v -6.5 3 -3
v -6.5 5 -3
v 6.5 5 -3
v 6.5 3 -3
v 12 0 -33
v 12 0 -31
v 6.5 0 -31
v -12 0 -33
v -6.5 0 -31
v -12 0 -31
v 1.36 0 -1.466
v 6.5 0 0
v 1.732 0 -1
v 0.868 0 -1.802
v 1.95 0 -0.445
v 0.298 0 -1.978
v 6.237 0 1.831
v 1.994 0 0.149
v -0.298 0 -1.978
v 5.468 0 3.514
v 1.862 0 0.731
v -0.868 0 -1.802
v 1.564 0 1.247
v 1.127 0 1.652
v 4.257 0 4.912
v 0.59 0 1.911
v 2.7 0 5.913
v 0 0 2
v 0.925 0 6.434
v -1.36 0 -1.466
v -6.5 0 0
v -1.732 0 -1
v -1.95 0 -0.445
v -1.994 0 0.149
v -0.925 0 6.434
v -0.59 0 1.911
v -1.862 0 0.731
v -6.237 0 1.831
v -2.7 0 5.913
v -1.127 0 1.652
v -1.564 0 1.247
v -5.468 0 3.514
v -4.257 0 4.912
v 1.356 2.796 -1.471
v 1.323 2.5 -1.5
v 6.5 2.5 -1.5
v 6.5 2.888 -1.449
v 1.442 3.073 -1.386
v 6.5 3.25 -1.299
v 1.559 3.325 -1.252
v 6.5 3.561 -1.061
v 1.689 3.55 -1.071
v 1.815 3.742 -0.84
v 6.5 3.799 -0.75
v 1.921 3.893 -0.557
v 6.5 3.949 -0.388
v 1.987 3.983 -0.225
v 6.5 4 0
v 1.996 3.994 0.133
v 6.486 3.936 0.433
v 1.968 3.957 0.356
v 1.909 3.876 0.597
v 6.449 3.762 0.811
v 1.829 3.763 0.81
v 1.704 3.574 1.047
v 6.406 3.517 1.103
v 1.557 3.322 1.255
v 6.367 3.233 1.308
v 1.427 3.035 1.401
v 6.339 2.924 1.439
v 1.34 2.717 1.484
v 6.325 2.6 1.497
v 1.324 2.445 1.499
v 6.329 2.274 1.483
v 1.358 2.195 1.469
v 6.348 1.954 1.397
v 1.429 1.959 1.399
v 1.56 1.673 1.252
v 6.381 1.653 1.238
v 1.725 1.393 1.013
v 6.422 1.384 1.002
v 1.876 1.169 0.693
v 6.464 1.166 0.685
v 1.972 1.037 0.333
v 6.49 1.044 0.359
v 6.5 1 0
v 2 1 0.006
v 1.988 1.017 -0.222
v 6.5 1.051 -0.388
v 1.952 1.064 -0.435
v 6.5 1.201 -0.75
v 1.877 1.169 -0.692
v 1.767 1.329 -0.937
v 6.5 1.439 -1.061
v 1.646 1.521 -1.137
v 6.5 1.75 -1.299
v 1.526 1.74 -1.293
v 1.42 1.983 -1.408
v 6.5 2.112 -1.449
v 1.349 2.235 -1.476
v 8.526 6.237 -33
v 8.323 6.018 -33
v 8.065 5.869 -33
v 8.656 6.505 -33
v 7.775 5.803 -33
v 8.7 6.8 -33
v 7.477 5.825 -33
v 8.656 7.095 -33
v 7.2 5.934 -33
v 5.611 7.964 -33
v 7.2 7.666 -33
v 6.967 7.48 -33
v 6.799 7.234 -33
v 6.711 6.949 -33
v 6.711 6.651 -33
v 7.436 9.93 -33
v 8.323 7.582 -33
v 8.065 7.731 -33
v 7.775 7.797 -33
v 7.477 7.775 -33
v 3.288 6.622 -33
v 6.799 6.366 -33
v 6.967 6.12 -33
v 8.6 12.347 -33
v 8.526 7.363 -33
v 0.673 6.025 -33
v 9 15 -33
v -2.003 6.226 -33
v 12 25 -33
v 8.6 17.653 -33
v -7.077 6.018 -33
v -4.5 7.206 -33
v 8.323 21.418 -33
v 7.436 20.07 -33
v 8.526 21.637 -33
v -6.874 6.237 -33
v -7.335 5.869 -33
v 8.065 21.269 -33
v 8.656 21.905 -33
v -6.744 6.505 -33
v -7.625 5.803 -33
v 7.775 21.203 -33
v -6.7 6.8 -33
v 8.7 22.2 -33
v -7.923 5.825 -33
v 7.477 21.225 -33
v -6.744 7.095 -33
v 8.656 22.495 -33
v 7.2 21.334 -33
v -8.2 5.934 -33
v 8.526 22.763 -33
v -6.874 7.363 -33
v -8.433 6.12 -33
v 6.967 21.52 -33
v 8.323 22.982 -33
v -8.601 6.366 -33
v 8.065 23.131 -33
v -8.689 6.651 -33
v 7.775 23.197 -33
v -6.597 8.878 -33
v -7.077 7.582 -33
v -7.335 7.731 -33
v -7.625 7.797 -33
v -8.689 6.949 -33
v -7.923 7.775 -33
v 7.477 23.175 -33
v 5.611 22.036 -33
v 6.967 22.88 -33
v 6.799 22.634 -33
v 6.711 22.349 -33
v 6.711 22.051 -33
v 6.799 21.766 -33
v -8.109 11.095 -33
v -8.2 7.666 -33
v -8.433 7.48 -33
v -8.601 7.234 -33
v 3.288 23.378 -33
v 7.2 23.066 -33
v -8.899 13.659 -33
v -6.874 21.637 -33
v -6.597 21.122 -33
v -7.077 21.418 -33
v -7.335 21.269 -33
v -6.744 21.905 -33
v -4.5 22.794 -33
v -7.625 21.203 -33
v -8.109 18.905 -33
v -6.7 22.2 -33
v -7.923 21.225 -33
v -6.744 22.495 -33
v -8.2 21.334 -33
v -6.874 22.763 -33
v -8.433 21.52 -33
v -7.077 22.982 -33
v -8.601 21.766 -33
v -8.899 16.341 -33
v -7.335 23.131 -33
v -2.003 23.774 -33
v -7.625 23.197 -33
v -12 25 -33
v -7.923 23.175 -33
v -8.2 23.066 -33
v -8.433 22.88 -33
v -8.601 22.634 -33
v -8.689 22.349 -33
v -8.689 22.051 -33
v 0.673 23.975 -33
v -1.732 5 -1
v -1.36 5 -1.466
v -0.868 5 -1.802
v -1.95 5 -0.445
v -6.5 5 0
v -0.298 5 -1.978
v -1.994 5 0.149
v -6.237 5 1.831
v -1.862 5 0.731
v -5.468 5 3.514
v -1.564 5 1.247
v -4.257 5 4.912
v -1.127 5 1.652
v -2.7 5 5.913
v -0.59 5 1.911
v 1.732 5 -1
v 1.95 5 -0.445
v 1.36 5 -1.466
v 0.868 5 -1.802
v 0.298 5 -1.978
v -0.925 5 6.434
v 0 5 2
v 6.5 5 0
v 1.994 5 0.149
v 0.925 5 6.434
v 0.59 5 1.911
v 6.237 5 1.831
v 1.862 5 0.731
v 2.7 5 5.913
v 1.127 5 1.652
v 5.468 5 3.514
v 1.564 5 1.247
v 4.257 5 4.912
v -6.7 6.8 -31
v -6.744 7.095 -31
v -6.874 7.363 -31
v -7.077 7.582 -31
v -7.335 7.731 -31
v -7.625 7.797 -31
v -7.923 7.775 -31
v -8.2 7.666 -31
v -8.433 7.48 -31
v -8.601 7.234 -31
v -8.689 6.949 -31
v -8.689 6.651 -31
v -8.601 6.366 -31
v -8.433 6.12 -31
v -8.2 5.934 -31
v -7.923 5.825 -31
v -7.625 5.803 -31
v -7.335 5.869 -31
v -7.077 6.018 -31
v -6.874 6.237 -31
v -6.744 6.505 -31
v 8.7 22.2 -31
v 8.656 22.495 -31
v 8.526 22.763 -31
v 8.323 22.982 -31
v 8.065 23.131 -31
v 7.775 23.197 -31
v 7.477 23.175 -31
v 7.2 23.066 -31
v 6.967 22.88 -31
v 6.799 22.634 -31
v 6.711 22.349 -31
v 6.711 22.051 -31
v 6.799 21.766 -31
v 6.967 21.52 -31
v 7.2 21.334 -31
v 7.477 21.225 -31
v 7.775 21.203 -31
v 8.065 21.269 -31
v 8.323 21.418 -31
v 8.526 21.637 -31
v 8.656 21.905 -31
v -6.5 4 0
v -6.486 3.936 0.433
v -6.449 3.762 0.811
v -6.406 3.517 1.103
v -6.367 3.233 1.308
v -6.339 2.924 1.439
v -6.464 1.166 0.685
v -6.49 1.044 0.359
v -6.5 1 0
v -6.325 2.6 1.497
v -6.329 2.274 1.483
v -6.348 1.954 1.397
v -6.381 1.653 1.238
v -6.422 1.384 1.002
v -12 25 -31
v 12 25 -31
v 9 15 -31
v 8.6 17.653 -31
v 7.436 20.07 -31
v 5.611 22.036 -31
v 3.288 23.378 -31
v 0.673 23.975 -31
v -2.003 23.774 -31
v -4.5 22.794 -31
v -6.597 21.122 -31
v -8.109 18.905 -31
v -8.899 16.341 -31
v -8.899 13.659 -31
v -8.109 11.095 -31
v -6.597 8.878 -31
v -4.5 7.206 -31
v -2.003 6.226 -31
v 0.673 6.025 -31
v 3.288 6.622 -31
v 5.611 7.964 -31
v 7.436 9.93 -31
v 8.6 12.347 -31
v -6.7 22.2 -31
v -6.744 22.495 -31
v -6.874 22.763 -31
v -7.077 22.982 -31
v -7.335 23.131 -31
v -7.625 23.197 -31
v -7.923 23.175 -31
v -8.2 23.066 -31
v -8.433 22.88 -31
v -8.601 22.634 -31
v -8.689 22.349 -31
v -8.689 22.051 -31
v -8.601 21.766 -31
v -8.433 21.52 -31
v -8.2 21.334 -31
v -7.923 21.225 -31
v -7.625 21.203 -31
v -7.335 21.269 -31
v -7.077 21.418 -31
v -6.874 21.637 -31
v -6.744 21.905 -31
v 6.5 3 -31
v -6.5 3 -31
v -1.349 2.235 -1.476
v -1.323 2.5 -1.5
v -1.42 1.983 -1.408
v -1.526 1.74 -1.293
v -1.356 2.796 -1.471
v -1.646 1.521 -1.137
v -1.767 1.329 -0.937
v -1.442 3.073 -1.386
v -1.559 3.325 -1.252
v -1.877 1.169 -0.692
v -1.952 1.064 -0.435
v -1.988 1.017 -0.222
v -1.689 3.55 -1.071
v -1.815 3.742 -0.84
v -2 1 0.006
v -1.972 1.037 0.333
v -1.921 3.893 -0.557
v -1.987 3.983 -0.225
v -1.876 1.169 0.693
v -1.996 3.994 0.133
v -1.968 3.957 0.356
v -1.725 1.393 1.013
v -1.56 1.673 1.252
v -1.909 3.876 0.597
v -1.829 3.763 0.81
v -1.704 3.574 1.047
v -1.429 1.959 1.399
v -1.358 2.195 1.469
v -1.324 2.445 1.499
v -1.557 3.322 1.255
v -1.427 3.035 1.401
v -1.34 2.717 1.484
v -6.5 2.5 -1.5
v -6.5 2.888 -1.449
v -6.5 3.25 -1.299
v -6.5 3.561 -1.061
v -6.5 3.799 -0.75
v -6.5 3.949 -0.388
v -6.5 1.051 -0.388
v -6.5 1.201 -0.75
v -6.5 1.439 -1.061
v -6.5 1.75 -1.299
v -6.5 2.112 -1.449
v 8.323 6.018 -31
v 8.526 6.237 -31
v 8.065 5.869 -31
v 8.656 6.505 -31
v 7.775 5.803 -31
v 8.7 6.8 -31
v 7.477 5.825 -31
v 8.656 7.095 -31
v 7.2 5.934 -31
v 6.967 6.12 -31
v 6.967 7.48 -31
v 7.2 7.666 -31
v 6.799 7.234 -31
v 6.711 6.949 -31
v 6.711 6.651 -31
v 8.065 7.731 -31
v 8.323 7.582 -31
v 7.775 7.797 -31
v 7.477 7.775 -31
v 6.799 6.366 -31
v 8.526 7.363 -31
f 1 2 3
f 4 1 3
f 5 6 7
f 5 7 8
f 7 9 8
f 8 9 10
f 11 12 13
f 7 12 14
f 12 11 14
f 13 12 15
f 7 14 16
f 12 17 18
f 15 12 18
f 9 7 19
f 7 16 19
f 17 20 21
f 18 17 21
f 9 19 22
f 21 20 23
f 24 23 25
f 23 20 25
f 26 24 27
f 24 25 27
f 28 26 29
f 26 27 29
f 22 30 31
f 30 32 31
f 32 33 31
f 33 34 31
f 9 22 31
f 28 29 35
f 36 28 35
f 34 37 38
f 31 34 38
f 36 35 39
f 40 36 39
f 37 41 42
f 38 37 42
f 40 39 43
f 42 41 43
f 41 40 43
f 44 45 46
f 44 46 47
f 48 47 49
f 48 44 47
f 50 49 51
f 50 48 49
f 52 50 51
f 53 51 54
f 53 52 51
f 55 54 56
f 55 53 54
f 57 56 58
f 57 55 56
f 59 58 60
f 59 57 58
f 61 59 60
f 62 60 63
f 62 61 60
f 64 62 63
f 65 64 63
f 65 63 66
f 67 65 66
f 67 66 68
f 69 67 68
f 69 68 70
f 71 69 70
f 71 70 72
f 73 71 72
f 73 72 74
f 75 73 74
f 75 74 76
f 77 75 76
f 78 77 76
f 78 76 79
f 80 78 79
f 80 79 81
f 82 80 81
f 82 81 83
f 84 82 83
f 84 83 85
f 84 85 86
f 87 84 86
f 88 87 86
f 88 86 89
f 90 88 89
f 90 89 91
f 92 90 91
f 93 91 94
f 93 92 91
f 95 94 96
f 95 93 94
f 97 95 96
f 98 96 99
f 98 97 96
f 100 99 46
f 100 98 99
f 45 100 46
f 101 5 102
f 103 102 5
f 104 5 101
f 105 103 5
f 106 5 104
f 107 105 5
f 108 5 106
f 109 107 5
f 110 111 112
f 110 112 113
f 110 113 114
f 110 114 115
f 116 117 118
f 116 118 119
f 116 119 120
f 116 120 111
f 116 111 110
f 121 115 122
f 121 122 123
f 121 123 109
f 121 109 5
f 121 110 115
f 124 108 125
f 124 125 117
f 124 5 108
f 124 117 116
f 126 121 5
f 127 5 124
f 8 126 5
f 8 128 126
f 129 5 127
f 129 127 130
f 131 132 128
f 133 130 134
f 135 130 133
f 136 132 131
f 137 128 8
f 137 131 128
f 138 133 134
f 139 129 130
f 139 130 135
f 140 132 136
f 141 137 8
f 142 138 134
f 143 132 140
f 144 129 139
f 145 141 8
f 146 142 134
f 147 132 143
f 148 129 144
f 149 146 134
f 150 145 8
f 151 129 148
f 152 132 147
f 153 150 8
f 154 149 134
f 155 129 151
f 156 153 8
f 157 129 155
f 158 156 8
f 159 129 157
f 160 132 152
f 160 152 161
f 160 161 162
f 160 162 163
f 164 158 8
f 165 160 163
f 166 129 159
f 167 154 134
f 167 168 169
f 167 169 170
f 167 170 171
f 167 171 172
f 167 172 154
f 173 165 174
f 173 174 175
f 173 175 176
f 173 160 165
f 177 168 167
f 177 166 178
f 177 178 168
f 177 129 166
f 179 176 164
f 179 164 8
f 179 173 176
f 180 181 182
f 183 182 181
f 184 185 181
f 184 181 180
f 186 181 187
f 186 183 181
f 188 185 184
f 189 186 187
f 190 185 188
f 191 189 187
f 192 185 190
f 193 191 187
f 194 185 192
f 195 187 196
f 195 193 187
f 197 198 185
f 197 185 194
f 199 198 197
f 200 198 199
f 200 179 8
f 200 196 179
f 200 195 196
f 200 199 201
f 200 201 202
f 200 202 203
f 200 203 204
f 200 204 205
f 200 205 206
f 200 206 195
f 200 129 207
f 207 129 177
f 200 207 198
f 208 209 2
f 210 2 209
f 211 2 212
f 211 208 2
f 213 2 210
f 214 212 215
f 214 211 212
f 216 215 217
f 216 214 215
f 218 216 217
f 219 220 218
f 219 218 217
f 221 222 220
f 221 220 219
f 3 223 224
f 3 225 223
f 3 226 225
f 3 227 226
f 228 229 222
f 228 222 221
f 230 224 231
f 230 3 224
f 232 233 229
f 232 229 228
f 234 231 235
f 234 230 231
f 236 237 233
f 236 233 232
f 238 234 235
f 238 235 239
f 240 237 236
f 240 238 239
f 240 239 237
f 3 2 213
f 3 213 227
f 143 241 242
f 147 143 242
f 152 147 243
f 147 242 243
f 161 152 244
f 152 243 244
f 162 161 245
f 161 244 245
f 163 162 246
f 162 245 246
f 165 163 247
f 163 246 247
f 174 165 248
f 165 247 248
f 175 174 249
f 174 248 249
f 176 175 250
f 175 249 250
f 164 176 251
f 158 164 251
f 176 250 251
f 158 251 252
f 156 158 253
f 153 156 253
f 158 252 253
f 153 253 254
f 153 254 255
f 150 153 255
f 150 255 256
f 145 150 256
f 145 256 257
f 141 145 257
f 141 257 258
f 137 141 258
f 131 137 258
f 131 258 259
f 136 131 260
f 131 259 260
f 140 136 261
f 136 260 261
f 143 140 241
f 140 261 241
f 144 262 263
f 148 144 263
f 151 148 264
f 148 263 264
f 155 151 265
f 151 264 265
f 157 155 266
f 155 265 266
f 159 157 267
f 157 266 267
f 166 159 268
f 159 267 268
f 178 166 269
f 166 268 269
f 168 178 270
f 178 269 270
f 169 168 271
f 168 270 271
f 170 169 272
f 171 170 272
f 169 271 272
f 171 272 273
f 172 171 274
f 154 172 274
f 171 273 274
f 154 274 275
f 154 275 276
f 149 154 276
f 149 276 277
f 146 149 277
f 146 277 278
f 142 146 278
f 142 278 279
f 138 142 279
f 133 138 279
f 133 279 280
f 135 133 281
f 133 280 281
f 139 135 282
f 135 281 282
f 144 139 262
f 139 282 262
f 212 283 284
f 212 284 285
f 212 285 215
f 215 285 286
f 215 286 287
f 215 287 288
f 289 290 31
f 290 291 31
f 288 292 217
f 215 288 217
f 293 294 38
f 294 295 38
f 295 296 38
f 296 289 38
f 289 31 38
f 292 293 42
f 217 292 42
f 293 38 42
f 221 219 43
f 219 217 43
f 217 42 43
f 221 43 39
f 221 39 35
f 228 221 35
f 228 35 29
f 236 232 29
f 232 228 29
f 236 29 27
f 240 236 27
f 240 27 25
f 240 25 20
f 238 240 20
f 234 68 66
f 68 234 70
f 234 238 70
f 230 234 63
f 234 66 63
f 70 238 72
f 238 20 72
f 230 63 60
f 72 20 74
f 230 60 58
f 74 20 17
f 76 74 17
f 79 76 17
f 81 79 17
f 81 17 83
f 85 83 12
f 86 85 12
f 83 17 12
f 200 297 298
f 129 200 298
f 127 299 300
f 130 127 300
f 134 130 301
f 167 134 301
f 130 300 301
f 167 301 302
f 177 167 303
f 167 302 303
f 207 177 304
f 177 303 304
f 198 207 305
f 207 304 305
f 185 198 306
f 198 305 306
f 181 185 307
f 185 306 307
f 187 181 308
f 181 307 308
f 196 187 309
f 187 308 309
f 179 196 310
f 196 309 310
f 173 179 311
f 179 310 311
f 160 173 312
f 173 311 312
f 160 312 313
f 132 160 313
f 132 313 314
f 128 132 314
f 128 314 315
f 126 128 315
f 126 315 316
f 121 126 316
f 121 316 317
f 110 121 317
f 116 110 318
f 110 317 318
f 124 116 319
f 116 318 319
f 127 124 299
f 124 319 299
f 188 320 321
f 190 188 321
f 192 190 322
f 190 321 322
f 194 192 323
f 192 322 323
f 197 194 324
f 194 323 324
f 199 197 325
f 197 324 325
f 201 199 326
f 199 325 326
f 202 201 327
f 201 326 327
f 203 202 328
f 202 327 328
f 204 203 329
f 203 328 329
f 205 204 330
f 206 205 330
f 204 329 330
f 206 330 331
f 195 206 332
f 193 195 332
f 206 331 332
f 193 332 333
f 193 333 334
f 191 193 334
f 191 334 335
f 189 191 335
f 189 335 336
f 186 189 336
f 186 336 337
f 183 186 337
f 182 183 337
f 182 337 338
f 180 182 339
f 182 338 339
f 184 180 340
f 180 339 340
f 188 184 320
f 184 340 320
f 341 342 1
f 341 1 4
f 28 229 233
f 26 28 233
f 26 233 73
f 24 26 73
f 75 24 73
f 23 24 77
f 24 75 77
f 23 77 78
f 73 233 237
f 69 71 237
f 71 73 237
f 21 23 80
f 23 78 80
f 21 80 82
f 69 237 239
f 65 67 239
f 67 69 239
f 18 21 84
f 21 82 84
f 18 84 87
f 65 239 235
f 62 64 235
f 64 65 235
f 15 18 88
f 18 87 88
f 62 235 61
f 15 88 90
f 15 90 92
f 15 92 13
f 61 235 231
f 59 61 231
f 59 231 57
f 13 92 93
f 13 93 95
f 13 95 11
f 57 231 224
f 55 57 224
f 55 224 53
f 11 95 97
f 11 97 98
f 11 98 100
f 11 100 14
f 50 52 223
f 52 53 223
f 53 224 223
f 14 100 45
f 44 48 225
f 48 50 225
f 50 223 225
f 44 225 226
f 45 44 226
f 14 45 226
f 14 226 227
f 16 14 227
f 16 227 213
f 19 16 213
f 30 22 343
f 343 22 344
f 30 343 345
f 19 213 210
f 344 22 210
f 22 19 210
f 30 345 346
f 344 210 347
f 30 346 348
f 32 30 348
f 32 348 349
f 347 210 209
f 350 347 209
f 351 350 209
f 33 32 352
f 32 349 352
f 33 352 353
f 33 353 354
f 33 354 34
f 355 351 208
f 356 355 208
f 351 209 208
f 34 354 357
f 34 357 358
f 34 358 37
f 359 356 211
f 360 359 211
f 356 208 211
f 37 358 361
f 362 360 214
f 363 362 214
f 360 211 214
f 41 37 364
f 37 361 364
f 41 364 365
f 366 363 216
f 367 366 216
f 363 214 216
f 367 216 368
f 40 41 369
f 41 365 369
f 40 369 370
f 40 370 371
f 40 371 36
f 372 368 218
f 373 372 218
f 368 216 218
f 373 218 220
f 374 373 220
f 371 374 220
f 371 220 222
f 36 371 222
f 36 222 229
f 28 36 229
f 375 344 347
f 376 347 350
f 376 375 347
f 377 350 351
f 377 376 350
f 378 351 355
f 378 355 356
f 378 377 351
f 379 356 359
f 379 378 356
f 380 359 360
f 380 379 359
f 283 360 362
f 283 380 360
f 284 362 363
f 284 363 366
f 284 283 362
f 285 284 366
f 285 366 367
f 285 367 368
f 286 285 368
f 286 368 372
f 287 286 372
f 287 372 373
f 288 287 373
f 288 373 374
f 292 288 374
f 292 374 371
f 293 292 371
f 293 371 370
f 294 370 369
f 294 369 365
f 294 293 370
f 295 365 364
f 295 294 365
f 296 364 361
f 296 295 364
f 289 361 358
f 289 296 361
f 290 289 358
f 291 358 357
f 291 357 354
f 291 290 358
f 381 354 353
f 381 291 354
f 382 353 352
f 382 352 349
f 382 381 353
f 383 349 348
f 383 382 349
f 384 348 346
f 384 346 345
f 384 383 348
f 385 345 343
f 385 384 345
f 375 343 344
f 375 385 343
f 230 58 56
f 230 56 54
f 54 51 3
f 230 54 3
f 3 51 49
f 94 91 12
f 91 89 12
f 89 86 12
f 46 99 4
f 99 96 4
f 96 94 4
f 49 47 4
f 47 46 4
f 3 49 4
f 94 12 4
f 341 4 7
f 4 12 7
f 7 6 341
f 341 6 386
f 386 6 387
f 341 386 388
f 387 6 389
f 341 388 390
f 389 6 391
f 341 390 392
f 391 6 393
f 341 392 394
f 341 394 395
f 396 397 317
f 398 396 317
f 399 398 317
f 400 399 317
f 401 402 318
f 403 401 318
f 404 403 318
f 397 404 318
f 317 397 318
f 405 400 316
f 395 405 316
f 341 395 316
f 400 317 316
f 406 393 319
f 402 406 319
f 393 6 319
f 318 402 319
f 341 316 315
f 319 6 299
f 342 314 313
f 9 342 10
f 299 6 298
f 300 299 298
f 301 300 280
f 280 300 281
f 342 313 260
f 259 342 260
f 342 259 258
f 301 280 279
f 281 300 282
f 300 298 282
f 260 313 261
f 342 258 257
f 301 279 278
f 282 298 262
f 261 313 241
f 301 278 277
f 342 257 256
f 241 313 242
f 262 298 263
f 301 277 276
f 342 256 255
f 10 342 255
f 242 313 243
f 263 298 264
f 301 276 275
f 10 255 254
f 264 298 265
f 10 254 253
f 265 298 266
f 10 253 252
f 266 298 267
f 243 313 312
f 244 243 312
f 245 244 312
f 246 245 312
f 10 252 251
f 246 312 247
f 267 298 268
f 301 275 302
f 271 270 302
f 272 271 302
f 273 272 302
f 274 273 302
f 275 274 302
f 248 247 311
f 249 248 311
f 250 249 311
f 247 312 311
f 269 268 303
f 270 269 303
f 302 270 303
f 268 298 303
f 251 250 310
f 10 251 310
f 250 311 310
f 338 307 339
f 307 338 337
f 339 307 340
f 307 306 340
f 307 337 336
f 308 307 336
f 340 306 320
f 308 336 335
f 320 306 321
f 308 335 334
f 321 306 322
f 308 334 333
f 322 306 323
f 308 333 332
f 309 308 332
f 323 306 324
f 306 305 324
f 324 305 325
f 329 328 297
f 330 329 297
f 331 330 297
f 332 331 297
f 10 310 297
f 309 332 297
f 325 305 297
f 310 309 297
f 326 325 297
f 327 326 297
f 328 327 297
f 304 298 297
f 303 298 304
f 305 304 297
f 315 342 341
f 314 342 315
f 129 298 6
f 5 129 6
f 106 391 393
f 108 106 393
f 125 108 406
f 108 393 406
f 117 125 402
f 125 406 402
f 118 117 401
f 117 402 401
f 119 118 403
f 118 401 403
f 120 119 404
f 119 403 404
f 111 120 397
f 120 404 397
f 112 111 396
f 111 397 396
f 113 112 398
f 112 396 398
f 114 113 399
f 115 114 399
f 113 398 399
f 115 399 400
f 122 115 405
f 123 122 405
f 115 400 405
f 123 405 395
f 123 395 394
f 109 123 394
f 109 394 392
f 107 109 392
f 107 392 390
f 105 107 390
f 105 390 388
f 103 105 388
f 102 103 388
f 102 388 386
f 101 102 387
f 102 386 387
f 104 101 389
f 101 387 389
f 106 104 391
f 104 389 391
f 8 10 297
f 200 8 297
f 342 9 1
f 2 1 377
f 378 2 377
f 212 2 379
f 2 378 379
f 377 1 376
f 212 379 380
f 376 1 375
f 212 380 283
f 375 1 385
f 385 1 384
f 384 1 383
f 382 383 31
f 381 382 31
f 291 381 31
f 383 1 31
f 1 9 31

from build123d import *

# Parameters (mm, degrees)
SKETCH_2_R               = 6.5
EXTRUDE_1_DEPTH          = 5
SKETCH_3_R               = 2
CUT_EXTRUDE_2_DEPTH      = 11.464224768
EXTRUDE_START            = -5
EXTRUDE_2_DEPTH          = 5
EXTRUDE_3_DEPTH          = 2
SKETCH_22_R              = 9
SKETCH_22_R_2            = 1
CUT_EXTRUDE_4_DEPTH      = 2
CUT_EXTRUDE_6_DEPTH      = 44.104524125
CUT_EXTRUDE_6_DEPTH_BACK = 44.104524125
SKETCH_23_R              = 1.5
SKETCH_24_W              = 13
SKETCH_24_H              = 28
CUT_EXTRUDE_7_DEPTH      = 2


with BuildPart() as part:
    # 草图2 → 凸台-拉伸1 (new body)
    with BuildSketch(Plane(origin=(0, 0, 0), x_dir=(1, 0, 0), z_dir=(0, 1, 0))):
        with Locations(Location((0, 0, 0), (0, 0, 270))):
            Circle(SKETCH_2_R)
    extrude(amount=EXTRUDE_1_DEPTH)

    # 草图3 → 切除-拉伸2 (cut, through all)
    with BuildSketch(Plane(origin=(0, 5, 0), x_dir=(1, 0, 0), z_dir=(0, 1, 0))):
        with Locations(Location((0, 0, 0), (0, 0, 270))):
            Circle(SKETCH_3_R)
    extrude(amount=-CUT_EXTRUDE_2_DEPTH, mode=Mode.SUBTRACT)

    # 草图4 → 凸台-拉伸2 (add)
    with BuildSketch(Plane(origin=(0, 5, 0), x_dir=(1, 0, 0), z_dir=(0, 1, 0)).offset(EXTRUDE_START)):
        with BuildLine():
            Line((6.5, 0), (6.5, 31))
            Line((6.5, 31), (3.899148682, 31))
            Line((3.899148682, 31), (-4.100851318, 31))
            Line((-4.100851318, 31), (-6.5, 31))
            Line((-6.5, 31), (-6.5, 0))
            ThreePointArc((-6.5, 0), (0, 6.5), (6.5, 0))
        make_face()
    extrude(amount=EXTRUDE_2_DEPTH)

    # 草图21 → 凸台-拉伸3 (add)
    with BuildSketch(Plane(origin=(0, 0, -31), x_dir=(-1, 0, 0), z_dir=(0, 0, -1))):
        Polygon((0, 0), (12, 0), (12, 25), (-12, 25), (-12, 0), align=None)
    extrude(amount=EXTRUDE_3_DEPTH)

    # 草图22 → 切除-拉伸4 (cut)
    with BuildSketch(Plane.XY.offset(-31)):
        with Locations((0, 15)):
            Circle(SKETCH_22_R)
        with Locations((7.7, 22.2)):
            Circle(SKETCH_22_R_2)
        with Locations((-7.7, 22.2)):
            Circle(SKETCH_22_R_2)
        with Locations((-7.7, 6.8)):
            Circle(SKETCH_22_R_2)
        with Locations((7.7, 6.8)):
            Circle(SKETCH_22_R_2)
    extrude(amount=-CUT_EXTRUDE_4_DEPTH, mode=Mode.SUBTRACT)

    # 草图23 → 切除-拉伸6 (cut, two sides: drawn at the far end of the back side and taken through both)
    with BuildSketch(Plane(origin=(0, 0, 0), x_dir=(0, 0, -1), z_dir=(1, 0, 0)).offset(-CUT_EXTRUDE_6_DEPTH_BACK)):
        with Locations((0, 2.5)):
            Circle(SKETCH_23_R)
    extrude(amount=CUT_EXTRUDE_6_DEPTH + CUT_EXTRUDE_6_DEPTH_BACK, mode=Mode.SUBTRACT)

    # 草图24 → 切除-拉伸7 (cut)
    with BuildSketch(Plane(origin=(0, 5, 0), x_dir=(1, 0, 0), z_dir=(0, 1, 0))):
        with Locations((0, 17)):
            Rectangle(SKETCH_24_W, SKETCH_24_H)
    extrude(amount=-CUT_EXTRUDE_7_DEPTH, mode=Mode.SUBTRACT)


solid = part.part
